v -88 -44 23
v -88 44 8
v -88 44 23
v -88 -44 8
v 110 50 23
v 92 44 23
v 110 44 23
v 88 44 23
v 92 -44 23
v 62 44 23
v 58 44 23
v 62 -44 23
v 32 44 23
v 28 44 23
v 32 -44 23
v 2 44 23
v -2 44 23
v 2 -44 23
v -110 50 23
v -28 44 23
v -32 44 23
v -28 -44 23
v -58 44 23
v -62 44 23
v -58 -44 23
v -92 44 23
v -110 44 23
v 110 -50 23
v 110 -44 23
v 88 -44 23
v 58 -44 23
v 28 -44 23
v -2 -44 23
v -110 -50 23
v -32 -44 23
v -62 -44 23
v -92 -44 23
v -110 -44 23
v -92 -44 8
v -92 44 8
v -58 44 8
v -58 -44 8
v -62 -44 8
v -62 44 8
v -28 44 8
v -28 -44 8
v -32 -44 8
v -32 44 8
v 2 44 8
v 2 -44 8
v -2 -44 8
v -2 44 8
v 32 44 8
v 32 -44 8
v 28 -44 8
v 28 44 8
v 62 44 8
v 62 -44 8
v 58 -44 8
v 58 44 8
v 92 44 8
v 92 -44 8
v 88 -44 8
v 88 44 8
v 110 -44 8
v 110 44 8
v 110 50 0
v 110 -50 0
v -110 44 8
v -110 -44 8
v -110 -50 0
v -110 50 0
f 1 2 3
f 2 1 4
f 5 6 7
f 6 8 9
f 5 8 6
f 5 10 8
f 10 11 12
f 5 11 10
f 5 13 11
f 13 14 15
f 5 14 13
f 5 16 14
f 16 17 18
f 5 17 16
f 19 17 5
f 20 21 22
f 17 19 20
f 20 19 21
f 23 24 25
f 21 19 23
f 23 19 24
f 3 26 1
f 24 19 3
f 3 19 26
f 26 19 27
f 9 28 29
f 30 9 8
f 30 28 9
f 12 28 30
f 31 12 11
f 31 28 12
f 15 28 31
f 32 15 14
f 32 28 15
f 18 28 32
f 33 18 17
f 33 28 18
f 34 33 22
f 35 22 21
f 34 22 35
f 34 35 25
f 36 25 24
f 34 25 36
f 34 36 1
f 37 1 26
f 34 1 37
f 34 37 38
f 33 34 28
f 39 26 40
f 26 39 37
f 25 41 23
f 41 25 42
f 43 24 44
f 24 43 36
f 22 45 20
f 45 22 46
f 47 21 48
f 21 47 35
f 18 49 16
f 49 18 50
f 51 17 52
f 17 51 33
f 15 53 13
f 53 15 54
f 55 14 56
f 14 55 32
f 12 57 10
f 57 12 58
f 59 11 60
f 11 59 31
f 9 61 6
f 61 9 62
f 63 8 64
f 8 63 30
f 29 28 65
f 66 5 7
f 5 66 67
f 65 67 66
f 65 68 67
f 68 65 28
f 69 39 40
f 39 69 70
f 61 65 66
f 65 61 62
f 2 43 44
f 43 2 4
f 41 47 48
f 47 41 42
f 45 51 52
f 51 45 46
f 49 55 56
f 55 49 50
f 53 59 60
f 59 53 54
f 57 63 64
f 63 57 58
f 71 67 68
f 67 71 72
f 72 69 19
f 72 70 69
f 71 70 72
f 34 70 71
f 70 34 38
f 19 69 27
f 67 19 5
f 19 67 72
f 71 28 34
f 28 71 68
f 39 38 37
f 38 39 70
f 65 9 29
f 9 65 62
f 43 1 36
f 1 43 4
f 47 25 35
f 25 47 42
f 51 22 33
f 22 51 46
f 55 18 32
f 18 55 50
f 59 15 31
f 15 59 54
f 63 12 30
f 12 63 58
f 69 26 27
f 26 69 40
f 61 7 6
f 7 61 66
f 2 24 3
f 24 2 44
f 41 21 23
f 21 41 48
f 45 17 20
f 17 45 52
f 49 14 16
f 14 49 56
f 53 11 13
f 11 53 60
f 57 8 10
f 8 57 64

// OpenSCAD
$fn = 32;

// ----------------------------------------------------------------------
// Rib frame 220 x 100 x 23
// 7 ribs at 30 mm pitch
// ----------------------------------------------------------------------

// --- parameters (mm) ---
frame = [220, 100, 8];  // base plate size (x, y, z)
rail_w = 6;             // side rail width
ribs = 7;               // number of ribs
rib_t = 4;              // rib thickness
rib_h = 15;             // rib height above the base plate
pitch = 30;             // pitch between rib centres

// --- derived feature positions (mm) ---
span = (ribs - 1) * pitch;          // = 180   distance between the outer ribs
origin_x = -span / 2;               // = -90   X of the first rib
rib_len = frame[1] - 2 * rail_w + 2;  // = 90   rib length, 1 mm into each rail
feature_centers = [
  [origin_x + 0 * pitch, 0],
  [origin_x + 1 * pitch, 0],
  [origin_x + 2 * pitch, 0],
  [origin_x + 3 * pitch, 0],
  [origin_x + 4 * pitch, 0],
  [origin_x + 5 * pitch, 0],
  [origin_x + 6 * pitch, 0]
];   // rib centre line, drives the rib loop

// base plate, two side rails, then the ribs read straight off feature_centers
union() {
  translate([-frame[0] / 2, -frame[1] / 2, 0]) cube(frame);
  translate([-frame[0] / 2, -frame[1] / 2, 0]) cube([frame[0], rail_w, frame[2] + rib_h]);
  translate([-frame[0] / 2, frame[1] / 2 - rail_w, 0]) cube([frame[0], rail_w, frame[2] + rib_h]);
  for (centre = feature_centers)
    translate([centre[0] - rib_t / 2, centre[1] - rib_len / 2, frame[2] - 1])
      cube([rib_t, rib_len, rib_h + 1]);
}
